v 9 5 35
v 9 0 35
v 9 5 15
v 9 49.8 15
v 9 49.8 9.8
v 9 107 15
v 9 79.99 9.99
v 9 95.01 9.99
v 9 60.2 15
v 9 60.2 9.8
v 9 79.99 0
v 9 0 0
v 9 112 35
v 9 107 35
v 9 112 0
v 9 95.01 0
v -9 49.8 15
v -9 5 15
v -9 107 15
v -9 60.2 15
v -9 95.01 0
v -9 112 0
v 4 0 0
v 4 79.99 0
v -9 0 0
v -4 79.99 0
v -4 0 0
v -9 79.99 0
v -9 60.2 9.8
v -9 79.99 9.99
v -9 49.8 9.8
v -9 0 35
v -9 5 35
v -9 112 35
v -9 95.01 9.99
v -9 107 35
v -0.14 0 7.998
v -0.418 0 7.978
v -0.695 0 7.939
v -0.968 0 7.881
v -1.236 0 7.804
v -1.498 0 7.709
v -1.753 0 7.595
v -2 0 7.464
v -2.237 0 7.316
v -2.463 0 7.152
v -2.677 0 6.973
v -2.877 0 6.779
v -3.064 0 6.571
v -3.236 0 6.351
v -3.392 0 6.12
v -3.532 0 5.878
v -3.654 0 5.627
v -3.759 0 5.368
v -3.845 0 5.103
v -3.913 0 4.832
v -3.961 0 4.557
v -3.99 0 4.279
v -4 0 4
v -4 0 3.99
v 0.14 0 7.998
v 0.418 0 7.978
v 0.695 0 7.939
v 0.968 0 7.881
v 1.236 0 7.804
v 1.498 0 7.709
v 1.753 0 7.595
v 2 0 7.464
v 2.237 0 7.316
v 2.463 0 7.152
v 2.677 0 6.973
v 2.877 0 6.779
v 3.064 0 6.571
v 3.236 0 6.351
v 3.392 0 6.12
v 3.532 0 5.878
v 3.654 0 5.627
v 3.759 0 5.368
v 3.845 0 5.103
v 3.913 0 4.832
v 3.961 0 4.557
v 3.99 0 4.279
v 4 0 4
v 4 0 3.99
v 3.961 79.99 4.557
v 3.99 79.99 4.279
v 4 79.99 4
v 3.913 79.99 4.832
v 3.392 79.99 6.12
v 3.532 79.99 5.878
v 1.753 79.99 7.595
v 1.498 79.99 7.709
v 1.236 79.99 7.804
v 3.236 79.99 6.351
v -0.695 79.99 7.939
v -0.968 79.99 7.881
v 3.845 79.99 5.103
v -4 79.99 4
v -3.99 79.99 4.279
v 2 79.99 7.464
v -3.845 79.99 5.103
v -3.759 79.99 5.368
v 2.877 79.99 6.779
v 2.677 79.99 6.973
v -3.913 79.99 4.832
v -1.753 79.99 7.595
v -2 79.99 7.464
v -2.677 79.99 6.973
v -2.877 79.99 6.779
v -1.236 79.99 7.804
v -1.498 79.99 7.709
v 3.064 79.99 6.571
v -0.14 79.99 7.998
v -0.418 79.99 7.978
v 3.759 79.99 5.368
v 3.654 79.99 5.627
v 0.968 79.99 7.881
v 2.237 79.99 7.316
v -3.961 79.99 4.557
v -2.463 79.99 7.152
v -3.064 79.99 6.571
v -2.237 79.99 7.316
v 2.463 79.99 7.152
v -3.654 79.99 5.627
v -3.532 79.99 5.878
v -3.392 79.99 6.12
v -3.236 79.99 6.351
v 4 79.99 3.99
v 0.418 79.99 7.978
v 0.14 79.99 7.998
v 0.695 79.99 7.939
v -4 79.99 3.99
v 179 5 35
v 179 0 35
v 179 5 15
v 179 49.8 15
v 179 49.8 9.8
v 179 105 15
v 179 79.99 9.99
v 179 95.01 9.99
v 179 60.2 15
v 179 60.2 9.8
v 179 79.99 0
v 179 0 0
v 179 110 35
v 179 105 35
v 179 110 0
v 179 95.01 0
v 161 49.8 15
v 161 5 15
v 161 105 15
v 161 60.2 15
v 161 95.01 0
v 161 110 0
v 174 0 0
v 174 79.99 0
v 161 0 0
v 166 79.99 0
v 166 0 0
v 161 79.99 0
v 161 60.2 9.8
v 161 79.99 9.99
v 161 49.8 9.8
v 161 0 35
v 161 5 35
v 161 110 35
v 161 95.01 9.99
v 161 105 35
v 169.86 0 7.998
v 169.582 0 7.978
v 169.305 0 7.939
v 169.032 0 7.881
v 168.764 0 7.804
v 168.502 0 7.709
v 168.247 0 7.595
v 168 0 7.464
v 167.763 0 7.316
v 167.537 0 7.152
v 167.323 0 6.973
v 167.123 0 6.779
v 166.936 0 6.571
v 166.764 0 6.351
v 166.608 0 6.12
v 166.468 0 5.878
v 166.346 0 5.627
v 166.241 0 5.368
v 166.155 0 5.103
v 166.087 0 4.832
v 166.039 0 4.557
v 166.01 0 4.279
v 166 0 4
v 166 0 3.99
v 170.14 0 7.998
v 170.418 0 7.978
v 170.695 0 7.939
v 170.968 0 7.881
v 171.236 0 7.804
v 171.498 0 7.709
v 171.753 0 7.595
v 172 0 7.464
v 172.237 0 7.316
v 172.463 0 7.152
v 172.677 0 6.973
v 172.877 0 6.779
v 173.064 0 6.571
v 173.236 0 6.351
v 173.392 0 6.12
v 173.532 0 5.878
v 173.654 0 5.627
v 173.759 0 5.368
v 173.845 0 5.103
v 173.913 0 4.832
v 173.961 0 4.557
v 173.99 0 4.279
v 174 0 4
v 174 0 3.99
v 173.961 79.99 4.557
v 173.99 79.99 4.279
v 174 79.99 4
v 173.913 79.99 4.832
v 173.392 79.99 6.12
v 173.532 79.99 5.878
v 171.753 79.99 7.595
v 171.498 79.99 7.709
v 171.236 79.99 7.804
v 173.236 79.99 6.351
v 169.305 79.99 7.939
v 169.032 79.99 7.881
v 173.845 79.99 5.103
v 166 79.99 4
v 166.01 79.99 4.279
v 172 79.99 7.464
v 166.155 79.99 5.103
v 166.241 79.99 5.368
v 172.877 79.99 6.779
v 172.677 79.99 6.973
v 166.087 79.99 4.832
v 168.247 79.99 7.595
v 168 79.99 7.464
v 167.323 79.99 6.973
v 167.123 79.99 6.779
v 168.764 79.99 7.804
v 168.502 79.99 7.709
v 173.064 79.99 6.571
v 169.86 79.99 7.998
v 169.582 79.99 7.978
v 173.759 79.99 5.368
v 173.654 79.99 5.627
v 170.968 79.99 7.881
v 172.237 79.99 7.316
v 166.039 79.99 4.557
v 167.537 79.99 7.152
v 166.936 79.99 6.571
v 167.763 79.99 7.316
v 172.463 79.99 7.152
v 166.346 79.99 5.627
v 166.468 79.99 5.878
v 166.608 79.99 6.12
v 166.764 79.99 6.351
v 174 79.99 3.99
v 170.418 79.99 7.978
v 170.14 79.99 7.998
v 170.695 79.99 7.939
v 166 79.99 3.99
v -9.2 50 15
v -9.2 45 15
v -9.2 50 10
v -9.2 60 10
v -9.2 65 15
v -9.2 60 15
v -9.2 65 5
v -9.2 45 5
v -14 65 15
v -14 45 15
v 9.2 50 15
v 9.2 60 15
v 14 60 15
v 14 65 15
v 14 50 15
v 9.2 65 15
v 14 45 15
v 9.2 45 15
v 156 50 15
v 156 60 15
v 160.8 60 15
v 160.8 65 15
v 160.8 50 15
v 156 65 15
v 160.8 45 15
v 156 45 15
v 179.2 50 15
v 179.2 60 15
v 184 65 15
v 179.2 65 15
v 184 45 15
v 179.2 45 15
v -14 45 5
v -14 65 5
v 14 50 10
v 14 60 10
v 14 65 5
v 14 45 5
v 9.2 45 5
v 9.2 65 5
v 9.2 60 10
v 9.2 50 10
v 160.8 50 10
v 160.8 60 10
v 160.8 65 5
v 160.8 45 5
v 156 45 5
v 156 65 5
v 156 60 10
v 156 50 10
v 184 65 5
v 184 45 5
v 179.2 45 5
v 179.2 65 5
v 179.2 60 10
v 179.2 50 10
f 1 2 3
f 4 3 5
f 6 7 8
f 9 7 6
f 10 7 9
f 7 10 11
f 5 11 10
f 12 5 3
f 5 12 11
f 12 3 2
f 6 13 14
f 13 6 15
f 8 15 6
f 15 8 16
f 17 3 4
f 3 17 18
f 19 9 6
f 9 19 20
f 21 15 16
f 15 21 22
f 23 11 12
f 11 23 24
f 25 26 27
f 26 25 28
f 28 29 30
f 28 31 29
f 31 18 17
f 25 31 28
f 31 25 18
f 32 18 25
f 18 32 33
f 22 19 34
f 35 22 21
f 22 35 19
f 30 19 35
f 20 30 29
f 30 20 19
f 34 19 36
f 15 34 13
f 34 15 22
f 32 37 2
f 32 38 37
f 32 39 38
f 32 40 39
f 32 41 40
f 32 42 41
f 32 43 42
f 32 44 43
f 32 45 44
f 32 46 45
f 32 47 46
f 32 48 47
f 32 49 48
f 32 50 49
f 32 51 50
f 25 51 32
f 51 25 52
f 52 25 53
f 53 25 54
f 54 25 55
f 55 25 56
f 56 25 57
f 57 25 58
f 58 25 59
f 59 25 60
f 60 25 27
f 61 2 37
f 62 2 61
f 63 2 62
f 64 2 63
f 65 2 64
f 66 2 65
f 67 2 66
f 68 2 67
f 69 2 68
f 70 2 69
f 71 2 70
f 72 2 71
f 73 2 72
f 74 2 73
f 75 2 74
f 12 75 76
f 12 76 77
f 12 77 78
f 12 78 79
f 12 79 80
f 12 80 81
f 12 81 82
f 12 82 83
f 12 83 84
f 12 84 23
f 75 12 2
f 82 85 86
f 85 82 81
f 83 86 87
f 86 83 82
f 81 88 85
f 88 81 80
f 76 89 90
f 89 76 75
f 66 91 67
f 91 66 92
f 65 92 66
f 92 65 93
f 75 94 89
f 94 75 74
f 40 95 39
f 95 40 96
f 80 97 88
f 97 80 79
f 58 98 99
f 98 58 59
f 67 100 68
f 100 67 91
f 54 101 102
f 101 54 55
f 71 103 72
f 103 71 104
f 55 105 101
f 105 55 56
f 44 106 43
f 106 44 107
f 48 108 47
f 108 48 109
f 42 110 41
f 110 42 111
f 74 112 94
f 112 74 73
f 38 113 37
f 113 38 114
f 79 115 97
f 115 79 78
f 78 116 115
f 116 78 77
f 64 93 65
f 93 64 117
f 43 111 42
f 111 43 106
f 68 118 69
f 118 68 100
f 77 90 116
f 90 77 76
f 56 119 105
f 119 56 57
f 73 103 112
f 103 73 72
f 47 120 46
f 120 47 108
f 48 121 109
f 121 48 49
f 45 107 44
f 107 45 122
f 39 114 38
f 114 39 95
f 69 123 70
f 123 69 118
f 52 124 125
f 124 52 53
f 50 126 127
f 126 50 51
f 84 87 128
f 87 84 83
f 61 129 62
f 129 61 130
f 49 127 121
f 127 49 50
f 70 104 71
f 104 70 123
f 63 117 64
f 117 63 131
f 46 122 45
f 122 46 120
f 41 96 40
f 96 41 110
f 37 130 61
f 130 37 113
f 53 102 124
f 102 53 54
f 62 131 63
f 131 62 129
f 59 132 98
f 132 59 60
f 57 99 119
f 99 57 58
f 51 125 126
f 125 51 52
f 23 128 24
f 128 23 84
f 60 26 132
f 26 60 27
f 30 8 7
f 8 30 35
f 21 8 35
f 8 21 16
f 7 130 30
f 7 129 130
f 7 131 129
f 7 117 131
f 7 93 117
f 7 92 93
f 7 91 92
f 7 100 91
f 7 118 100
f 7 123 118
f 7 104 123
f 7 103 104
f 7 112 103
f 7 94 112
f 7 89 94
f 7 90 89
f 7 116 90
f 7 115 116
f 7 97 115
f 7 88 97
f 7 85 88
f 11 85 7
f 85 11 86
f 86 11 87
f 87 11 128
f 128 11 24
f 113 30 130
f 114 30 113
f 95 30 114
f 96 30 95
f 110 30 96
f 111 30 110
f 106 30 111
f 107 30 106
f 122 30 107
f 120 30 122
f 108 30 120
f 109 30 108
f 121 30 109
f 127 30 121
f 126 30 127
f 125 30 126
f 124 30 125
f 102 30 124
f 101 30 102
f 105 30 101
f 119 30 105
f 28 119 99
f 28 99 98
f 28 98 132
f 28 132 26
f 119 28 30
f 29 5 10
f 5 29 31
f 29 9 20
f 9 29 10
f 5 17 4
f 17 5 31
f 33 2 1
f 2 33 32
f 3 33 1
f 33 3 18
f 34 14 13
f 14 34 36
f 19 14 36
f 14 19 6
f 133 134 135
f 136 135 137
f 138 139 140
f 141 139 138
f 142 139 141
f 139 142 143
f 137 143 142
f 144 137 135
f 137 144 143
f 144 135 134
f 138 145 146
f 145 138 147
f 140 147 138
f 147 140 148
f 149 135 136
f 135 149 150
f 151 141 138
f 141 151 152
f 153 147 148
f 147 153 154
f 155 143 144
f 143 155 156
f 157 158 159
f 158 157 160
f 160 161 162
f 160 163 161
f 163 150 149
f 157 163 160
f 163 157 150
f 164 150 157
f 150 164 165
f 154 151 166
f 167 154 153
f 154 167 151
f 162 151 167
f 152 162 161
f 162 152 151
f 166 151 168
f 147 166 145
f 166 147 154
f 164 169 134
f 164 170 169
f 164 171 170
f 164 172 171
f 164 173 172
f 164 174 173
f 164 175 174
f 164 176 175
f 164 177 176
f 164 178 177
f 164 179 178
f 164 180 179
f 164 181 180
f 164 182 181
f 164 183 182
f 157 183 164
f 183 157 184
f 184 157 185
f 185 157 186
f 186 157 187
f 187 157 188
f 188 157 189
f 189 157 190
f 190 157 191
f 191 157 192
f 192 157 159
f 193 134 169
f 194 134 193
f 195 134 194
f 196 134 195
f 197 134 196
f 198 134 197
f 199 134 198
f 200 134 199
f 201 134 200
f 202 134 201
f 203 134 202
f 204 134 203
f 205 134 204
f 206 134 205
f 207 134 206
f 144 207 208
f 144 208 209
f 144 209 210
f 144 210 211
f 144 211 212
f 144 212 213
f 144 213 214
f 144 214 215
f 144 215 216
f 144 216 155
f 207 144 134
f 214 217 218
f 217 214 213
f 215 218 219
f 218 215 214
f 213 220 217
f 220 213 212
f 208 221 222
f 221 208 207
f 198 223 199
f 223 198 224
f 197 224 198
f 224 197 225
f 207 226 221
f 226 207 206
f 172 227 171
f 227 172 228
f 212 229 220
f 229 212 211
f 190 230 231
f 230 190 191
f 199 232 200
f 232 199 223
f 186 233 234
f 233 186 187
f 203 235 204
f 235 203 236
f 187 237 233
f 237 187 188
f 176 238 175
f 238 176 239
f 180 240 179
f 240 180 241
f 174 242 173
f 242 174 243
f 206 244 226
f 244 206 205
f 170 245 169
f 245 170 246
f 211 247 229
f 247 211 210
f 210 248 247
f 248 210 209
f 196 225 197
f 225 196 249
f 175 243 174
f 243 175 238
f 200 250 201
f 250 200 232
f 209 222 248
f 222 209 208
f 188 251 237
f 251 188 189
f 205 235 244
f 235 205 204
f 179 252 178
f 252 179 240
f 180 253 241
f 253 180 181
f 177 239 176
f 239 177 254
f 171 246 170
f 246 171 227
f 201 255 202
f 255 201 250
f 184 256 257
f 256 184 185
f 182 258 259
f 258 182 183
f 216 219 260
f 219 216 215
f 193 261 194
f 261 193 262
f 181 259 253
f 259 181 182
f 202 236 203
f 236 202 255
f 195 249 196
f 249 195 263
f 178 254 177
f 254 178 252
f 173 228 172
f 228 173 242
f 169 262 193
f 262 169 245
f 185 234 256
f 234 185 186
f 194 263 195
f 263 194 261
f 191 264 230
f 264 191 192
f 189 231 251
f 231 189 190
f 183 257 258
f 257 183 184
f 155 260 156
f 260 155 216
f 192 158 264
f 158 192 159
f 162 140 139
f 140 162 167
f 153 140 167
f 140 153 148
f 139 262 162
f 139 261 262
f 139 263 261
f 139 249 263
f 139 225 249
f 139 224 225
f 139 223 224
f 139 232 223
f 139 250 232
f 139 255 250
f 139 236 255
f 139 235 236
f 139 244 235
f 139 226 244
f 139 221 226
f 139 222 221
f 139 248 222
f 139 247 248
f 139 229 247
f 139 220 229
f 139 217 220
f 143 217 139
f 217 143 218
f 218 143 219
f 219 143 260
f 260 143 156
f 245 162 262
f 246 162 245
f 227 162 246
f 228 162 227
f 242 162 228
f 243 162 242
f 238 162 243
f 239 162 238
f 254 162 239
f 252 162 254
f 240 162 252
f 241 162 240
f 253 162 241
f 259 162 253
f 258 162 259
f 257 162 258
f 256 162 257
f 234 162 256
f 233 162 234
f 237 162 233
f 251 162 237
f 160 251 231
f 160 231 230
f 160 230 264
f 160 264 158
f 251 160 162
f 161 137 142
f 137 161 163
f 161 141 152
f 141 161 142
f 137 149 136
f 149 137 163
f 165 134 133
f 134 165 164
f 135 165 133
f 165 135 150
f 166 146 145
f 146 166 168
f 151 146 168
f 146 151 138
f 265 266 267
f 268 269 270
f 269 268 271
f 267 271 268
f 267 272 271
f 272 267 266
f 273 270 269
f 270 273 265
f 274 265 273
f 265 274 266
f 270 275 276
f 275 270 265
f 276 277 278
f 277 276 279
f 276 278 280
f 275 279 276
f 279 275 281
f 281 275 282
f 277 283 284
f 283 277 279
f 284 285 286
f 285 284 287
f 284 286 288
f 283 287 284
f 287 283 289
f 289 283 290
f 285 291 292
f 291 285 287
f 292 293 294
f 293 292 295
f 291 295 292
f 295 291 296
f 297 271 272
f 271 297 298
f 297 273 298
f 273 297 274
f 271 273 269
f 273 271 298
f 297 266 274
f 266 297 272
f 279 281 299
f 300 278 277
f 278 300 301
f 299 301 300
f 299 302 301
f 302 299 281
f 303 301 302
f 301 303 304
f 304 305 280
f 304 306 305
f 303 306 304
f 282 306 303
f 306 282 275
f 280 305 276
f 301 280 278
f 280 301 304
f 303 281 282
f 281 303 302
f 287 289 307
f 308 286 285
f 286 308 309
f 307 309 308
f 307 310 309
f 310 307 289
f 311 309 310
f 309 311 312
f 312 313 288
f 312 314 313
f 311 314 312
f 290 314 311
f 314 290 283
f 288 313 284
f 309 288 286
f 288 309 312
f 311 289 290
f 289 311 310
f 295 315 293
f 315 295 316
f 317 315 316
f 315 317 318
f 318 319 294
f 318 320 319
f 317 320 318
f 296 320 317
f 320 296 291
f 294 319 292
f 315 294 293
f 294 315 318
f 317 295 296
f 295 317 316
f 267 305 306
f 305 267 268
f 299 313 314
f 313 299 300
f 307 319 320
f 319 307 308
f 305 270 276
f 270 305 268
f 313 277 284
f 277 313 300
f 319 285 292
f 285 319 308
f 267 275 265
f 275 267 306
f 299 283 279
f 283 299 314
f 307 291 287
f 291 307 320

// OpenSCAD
eps = 0.01;
$fn = 90;
tol = 0.2;

// branches
wt = 5;
// carriage diametee
c_d = 8;
c_y = 80;
c_yo = 20;
c_yoo = 2;
c_h = 20;
c_zo = 2;
c_l = 170;

module carriage_hook(off)
{
    _a = c_d+2*wt;
    _b = c_y+c_yo+2*wt+off;
    _c = c_d+c_zo+wt;
    
    difference()
    {
        
        translate([-_a/2,0,0])
            cube([_a,_b,_c]);
        // carriage lock
        translate([0,c_y,c_d/2])
            rotate([90,0,0])
                cylinder(h=c_y+2*eps,d=c_d);
        // carriage border for better grip
        translate([-c_d/2,-eps,-eps])
            cube([c_d,c_y+2*eps,c_d/2]);
        // carriage end cutoff
        translate([-c_d/2-wt-eps, c_y-eps, -eps])
            cube([c_d+2*wt+2*eps, c_yo+2*eps-wt, c_d+c_zo]);
        // 
        //translate([-c_d/2-wt-eps, c_y-eps, -eps])
        //    cube([c_d+2*wt+2*eps, c_yo+2*eps-wt, c_d+c_zo]);
        
        // hook connector
        translate([-c_d/2-wt-eps,(c_y+c_yo)/2-tol,_c-wt-tol])
            cube([c_d+2*wt+2*eps,2*wt+2*tol,wt+tol+eps]);
    }
    
    // front border
    translate([-c_d/2-wt,0,c_d+wt+c_zo])
        cube([c_d+2*wt,wt,c_h]);
    // back border
    translate([-c_d/2-wt,_b-wt,c_d+wt+c_zo])
        cube([c_d+2*wt,wt,c_h]);
}

module left_hook()
{
    carriage_hook(2);
}

module right_hook()
{
    carriage_hook(0);
}



module power_source_travel_holder()
{
    left_hook();
    
    translate([c_l,0,0])
        right_hook(0);
    
    // connector
    _l = 4*wt + c_d + c_l;
    translate([-2*wt-c_d/2,(c_y+c_yo)/2,c_d+c_zo])
        union()
        {
            // main part
            cube([_l,2*wt,wt]);
            
            translate([0,-wt,-wt])
            {
                // left borders
                cube([wt-tol,4*wt,2*wt]);
                translate([3*wt+c_d+tol,0,0])
                    cube([wt-tol,4*wt,2*wt]);
                
                // right borders
                translate([c_l,0,0])
                    cube([wt-tol,4*wt,2*wt]);
                translate([3*wt+c_d+tol+c_l,0,0])
                    cube([wt-tol,4*wt,2*wt]);
            }
            
        }
        
}

power_source_travel_holder();
